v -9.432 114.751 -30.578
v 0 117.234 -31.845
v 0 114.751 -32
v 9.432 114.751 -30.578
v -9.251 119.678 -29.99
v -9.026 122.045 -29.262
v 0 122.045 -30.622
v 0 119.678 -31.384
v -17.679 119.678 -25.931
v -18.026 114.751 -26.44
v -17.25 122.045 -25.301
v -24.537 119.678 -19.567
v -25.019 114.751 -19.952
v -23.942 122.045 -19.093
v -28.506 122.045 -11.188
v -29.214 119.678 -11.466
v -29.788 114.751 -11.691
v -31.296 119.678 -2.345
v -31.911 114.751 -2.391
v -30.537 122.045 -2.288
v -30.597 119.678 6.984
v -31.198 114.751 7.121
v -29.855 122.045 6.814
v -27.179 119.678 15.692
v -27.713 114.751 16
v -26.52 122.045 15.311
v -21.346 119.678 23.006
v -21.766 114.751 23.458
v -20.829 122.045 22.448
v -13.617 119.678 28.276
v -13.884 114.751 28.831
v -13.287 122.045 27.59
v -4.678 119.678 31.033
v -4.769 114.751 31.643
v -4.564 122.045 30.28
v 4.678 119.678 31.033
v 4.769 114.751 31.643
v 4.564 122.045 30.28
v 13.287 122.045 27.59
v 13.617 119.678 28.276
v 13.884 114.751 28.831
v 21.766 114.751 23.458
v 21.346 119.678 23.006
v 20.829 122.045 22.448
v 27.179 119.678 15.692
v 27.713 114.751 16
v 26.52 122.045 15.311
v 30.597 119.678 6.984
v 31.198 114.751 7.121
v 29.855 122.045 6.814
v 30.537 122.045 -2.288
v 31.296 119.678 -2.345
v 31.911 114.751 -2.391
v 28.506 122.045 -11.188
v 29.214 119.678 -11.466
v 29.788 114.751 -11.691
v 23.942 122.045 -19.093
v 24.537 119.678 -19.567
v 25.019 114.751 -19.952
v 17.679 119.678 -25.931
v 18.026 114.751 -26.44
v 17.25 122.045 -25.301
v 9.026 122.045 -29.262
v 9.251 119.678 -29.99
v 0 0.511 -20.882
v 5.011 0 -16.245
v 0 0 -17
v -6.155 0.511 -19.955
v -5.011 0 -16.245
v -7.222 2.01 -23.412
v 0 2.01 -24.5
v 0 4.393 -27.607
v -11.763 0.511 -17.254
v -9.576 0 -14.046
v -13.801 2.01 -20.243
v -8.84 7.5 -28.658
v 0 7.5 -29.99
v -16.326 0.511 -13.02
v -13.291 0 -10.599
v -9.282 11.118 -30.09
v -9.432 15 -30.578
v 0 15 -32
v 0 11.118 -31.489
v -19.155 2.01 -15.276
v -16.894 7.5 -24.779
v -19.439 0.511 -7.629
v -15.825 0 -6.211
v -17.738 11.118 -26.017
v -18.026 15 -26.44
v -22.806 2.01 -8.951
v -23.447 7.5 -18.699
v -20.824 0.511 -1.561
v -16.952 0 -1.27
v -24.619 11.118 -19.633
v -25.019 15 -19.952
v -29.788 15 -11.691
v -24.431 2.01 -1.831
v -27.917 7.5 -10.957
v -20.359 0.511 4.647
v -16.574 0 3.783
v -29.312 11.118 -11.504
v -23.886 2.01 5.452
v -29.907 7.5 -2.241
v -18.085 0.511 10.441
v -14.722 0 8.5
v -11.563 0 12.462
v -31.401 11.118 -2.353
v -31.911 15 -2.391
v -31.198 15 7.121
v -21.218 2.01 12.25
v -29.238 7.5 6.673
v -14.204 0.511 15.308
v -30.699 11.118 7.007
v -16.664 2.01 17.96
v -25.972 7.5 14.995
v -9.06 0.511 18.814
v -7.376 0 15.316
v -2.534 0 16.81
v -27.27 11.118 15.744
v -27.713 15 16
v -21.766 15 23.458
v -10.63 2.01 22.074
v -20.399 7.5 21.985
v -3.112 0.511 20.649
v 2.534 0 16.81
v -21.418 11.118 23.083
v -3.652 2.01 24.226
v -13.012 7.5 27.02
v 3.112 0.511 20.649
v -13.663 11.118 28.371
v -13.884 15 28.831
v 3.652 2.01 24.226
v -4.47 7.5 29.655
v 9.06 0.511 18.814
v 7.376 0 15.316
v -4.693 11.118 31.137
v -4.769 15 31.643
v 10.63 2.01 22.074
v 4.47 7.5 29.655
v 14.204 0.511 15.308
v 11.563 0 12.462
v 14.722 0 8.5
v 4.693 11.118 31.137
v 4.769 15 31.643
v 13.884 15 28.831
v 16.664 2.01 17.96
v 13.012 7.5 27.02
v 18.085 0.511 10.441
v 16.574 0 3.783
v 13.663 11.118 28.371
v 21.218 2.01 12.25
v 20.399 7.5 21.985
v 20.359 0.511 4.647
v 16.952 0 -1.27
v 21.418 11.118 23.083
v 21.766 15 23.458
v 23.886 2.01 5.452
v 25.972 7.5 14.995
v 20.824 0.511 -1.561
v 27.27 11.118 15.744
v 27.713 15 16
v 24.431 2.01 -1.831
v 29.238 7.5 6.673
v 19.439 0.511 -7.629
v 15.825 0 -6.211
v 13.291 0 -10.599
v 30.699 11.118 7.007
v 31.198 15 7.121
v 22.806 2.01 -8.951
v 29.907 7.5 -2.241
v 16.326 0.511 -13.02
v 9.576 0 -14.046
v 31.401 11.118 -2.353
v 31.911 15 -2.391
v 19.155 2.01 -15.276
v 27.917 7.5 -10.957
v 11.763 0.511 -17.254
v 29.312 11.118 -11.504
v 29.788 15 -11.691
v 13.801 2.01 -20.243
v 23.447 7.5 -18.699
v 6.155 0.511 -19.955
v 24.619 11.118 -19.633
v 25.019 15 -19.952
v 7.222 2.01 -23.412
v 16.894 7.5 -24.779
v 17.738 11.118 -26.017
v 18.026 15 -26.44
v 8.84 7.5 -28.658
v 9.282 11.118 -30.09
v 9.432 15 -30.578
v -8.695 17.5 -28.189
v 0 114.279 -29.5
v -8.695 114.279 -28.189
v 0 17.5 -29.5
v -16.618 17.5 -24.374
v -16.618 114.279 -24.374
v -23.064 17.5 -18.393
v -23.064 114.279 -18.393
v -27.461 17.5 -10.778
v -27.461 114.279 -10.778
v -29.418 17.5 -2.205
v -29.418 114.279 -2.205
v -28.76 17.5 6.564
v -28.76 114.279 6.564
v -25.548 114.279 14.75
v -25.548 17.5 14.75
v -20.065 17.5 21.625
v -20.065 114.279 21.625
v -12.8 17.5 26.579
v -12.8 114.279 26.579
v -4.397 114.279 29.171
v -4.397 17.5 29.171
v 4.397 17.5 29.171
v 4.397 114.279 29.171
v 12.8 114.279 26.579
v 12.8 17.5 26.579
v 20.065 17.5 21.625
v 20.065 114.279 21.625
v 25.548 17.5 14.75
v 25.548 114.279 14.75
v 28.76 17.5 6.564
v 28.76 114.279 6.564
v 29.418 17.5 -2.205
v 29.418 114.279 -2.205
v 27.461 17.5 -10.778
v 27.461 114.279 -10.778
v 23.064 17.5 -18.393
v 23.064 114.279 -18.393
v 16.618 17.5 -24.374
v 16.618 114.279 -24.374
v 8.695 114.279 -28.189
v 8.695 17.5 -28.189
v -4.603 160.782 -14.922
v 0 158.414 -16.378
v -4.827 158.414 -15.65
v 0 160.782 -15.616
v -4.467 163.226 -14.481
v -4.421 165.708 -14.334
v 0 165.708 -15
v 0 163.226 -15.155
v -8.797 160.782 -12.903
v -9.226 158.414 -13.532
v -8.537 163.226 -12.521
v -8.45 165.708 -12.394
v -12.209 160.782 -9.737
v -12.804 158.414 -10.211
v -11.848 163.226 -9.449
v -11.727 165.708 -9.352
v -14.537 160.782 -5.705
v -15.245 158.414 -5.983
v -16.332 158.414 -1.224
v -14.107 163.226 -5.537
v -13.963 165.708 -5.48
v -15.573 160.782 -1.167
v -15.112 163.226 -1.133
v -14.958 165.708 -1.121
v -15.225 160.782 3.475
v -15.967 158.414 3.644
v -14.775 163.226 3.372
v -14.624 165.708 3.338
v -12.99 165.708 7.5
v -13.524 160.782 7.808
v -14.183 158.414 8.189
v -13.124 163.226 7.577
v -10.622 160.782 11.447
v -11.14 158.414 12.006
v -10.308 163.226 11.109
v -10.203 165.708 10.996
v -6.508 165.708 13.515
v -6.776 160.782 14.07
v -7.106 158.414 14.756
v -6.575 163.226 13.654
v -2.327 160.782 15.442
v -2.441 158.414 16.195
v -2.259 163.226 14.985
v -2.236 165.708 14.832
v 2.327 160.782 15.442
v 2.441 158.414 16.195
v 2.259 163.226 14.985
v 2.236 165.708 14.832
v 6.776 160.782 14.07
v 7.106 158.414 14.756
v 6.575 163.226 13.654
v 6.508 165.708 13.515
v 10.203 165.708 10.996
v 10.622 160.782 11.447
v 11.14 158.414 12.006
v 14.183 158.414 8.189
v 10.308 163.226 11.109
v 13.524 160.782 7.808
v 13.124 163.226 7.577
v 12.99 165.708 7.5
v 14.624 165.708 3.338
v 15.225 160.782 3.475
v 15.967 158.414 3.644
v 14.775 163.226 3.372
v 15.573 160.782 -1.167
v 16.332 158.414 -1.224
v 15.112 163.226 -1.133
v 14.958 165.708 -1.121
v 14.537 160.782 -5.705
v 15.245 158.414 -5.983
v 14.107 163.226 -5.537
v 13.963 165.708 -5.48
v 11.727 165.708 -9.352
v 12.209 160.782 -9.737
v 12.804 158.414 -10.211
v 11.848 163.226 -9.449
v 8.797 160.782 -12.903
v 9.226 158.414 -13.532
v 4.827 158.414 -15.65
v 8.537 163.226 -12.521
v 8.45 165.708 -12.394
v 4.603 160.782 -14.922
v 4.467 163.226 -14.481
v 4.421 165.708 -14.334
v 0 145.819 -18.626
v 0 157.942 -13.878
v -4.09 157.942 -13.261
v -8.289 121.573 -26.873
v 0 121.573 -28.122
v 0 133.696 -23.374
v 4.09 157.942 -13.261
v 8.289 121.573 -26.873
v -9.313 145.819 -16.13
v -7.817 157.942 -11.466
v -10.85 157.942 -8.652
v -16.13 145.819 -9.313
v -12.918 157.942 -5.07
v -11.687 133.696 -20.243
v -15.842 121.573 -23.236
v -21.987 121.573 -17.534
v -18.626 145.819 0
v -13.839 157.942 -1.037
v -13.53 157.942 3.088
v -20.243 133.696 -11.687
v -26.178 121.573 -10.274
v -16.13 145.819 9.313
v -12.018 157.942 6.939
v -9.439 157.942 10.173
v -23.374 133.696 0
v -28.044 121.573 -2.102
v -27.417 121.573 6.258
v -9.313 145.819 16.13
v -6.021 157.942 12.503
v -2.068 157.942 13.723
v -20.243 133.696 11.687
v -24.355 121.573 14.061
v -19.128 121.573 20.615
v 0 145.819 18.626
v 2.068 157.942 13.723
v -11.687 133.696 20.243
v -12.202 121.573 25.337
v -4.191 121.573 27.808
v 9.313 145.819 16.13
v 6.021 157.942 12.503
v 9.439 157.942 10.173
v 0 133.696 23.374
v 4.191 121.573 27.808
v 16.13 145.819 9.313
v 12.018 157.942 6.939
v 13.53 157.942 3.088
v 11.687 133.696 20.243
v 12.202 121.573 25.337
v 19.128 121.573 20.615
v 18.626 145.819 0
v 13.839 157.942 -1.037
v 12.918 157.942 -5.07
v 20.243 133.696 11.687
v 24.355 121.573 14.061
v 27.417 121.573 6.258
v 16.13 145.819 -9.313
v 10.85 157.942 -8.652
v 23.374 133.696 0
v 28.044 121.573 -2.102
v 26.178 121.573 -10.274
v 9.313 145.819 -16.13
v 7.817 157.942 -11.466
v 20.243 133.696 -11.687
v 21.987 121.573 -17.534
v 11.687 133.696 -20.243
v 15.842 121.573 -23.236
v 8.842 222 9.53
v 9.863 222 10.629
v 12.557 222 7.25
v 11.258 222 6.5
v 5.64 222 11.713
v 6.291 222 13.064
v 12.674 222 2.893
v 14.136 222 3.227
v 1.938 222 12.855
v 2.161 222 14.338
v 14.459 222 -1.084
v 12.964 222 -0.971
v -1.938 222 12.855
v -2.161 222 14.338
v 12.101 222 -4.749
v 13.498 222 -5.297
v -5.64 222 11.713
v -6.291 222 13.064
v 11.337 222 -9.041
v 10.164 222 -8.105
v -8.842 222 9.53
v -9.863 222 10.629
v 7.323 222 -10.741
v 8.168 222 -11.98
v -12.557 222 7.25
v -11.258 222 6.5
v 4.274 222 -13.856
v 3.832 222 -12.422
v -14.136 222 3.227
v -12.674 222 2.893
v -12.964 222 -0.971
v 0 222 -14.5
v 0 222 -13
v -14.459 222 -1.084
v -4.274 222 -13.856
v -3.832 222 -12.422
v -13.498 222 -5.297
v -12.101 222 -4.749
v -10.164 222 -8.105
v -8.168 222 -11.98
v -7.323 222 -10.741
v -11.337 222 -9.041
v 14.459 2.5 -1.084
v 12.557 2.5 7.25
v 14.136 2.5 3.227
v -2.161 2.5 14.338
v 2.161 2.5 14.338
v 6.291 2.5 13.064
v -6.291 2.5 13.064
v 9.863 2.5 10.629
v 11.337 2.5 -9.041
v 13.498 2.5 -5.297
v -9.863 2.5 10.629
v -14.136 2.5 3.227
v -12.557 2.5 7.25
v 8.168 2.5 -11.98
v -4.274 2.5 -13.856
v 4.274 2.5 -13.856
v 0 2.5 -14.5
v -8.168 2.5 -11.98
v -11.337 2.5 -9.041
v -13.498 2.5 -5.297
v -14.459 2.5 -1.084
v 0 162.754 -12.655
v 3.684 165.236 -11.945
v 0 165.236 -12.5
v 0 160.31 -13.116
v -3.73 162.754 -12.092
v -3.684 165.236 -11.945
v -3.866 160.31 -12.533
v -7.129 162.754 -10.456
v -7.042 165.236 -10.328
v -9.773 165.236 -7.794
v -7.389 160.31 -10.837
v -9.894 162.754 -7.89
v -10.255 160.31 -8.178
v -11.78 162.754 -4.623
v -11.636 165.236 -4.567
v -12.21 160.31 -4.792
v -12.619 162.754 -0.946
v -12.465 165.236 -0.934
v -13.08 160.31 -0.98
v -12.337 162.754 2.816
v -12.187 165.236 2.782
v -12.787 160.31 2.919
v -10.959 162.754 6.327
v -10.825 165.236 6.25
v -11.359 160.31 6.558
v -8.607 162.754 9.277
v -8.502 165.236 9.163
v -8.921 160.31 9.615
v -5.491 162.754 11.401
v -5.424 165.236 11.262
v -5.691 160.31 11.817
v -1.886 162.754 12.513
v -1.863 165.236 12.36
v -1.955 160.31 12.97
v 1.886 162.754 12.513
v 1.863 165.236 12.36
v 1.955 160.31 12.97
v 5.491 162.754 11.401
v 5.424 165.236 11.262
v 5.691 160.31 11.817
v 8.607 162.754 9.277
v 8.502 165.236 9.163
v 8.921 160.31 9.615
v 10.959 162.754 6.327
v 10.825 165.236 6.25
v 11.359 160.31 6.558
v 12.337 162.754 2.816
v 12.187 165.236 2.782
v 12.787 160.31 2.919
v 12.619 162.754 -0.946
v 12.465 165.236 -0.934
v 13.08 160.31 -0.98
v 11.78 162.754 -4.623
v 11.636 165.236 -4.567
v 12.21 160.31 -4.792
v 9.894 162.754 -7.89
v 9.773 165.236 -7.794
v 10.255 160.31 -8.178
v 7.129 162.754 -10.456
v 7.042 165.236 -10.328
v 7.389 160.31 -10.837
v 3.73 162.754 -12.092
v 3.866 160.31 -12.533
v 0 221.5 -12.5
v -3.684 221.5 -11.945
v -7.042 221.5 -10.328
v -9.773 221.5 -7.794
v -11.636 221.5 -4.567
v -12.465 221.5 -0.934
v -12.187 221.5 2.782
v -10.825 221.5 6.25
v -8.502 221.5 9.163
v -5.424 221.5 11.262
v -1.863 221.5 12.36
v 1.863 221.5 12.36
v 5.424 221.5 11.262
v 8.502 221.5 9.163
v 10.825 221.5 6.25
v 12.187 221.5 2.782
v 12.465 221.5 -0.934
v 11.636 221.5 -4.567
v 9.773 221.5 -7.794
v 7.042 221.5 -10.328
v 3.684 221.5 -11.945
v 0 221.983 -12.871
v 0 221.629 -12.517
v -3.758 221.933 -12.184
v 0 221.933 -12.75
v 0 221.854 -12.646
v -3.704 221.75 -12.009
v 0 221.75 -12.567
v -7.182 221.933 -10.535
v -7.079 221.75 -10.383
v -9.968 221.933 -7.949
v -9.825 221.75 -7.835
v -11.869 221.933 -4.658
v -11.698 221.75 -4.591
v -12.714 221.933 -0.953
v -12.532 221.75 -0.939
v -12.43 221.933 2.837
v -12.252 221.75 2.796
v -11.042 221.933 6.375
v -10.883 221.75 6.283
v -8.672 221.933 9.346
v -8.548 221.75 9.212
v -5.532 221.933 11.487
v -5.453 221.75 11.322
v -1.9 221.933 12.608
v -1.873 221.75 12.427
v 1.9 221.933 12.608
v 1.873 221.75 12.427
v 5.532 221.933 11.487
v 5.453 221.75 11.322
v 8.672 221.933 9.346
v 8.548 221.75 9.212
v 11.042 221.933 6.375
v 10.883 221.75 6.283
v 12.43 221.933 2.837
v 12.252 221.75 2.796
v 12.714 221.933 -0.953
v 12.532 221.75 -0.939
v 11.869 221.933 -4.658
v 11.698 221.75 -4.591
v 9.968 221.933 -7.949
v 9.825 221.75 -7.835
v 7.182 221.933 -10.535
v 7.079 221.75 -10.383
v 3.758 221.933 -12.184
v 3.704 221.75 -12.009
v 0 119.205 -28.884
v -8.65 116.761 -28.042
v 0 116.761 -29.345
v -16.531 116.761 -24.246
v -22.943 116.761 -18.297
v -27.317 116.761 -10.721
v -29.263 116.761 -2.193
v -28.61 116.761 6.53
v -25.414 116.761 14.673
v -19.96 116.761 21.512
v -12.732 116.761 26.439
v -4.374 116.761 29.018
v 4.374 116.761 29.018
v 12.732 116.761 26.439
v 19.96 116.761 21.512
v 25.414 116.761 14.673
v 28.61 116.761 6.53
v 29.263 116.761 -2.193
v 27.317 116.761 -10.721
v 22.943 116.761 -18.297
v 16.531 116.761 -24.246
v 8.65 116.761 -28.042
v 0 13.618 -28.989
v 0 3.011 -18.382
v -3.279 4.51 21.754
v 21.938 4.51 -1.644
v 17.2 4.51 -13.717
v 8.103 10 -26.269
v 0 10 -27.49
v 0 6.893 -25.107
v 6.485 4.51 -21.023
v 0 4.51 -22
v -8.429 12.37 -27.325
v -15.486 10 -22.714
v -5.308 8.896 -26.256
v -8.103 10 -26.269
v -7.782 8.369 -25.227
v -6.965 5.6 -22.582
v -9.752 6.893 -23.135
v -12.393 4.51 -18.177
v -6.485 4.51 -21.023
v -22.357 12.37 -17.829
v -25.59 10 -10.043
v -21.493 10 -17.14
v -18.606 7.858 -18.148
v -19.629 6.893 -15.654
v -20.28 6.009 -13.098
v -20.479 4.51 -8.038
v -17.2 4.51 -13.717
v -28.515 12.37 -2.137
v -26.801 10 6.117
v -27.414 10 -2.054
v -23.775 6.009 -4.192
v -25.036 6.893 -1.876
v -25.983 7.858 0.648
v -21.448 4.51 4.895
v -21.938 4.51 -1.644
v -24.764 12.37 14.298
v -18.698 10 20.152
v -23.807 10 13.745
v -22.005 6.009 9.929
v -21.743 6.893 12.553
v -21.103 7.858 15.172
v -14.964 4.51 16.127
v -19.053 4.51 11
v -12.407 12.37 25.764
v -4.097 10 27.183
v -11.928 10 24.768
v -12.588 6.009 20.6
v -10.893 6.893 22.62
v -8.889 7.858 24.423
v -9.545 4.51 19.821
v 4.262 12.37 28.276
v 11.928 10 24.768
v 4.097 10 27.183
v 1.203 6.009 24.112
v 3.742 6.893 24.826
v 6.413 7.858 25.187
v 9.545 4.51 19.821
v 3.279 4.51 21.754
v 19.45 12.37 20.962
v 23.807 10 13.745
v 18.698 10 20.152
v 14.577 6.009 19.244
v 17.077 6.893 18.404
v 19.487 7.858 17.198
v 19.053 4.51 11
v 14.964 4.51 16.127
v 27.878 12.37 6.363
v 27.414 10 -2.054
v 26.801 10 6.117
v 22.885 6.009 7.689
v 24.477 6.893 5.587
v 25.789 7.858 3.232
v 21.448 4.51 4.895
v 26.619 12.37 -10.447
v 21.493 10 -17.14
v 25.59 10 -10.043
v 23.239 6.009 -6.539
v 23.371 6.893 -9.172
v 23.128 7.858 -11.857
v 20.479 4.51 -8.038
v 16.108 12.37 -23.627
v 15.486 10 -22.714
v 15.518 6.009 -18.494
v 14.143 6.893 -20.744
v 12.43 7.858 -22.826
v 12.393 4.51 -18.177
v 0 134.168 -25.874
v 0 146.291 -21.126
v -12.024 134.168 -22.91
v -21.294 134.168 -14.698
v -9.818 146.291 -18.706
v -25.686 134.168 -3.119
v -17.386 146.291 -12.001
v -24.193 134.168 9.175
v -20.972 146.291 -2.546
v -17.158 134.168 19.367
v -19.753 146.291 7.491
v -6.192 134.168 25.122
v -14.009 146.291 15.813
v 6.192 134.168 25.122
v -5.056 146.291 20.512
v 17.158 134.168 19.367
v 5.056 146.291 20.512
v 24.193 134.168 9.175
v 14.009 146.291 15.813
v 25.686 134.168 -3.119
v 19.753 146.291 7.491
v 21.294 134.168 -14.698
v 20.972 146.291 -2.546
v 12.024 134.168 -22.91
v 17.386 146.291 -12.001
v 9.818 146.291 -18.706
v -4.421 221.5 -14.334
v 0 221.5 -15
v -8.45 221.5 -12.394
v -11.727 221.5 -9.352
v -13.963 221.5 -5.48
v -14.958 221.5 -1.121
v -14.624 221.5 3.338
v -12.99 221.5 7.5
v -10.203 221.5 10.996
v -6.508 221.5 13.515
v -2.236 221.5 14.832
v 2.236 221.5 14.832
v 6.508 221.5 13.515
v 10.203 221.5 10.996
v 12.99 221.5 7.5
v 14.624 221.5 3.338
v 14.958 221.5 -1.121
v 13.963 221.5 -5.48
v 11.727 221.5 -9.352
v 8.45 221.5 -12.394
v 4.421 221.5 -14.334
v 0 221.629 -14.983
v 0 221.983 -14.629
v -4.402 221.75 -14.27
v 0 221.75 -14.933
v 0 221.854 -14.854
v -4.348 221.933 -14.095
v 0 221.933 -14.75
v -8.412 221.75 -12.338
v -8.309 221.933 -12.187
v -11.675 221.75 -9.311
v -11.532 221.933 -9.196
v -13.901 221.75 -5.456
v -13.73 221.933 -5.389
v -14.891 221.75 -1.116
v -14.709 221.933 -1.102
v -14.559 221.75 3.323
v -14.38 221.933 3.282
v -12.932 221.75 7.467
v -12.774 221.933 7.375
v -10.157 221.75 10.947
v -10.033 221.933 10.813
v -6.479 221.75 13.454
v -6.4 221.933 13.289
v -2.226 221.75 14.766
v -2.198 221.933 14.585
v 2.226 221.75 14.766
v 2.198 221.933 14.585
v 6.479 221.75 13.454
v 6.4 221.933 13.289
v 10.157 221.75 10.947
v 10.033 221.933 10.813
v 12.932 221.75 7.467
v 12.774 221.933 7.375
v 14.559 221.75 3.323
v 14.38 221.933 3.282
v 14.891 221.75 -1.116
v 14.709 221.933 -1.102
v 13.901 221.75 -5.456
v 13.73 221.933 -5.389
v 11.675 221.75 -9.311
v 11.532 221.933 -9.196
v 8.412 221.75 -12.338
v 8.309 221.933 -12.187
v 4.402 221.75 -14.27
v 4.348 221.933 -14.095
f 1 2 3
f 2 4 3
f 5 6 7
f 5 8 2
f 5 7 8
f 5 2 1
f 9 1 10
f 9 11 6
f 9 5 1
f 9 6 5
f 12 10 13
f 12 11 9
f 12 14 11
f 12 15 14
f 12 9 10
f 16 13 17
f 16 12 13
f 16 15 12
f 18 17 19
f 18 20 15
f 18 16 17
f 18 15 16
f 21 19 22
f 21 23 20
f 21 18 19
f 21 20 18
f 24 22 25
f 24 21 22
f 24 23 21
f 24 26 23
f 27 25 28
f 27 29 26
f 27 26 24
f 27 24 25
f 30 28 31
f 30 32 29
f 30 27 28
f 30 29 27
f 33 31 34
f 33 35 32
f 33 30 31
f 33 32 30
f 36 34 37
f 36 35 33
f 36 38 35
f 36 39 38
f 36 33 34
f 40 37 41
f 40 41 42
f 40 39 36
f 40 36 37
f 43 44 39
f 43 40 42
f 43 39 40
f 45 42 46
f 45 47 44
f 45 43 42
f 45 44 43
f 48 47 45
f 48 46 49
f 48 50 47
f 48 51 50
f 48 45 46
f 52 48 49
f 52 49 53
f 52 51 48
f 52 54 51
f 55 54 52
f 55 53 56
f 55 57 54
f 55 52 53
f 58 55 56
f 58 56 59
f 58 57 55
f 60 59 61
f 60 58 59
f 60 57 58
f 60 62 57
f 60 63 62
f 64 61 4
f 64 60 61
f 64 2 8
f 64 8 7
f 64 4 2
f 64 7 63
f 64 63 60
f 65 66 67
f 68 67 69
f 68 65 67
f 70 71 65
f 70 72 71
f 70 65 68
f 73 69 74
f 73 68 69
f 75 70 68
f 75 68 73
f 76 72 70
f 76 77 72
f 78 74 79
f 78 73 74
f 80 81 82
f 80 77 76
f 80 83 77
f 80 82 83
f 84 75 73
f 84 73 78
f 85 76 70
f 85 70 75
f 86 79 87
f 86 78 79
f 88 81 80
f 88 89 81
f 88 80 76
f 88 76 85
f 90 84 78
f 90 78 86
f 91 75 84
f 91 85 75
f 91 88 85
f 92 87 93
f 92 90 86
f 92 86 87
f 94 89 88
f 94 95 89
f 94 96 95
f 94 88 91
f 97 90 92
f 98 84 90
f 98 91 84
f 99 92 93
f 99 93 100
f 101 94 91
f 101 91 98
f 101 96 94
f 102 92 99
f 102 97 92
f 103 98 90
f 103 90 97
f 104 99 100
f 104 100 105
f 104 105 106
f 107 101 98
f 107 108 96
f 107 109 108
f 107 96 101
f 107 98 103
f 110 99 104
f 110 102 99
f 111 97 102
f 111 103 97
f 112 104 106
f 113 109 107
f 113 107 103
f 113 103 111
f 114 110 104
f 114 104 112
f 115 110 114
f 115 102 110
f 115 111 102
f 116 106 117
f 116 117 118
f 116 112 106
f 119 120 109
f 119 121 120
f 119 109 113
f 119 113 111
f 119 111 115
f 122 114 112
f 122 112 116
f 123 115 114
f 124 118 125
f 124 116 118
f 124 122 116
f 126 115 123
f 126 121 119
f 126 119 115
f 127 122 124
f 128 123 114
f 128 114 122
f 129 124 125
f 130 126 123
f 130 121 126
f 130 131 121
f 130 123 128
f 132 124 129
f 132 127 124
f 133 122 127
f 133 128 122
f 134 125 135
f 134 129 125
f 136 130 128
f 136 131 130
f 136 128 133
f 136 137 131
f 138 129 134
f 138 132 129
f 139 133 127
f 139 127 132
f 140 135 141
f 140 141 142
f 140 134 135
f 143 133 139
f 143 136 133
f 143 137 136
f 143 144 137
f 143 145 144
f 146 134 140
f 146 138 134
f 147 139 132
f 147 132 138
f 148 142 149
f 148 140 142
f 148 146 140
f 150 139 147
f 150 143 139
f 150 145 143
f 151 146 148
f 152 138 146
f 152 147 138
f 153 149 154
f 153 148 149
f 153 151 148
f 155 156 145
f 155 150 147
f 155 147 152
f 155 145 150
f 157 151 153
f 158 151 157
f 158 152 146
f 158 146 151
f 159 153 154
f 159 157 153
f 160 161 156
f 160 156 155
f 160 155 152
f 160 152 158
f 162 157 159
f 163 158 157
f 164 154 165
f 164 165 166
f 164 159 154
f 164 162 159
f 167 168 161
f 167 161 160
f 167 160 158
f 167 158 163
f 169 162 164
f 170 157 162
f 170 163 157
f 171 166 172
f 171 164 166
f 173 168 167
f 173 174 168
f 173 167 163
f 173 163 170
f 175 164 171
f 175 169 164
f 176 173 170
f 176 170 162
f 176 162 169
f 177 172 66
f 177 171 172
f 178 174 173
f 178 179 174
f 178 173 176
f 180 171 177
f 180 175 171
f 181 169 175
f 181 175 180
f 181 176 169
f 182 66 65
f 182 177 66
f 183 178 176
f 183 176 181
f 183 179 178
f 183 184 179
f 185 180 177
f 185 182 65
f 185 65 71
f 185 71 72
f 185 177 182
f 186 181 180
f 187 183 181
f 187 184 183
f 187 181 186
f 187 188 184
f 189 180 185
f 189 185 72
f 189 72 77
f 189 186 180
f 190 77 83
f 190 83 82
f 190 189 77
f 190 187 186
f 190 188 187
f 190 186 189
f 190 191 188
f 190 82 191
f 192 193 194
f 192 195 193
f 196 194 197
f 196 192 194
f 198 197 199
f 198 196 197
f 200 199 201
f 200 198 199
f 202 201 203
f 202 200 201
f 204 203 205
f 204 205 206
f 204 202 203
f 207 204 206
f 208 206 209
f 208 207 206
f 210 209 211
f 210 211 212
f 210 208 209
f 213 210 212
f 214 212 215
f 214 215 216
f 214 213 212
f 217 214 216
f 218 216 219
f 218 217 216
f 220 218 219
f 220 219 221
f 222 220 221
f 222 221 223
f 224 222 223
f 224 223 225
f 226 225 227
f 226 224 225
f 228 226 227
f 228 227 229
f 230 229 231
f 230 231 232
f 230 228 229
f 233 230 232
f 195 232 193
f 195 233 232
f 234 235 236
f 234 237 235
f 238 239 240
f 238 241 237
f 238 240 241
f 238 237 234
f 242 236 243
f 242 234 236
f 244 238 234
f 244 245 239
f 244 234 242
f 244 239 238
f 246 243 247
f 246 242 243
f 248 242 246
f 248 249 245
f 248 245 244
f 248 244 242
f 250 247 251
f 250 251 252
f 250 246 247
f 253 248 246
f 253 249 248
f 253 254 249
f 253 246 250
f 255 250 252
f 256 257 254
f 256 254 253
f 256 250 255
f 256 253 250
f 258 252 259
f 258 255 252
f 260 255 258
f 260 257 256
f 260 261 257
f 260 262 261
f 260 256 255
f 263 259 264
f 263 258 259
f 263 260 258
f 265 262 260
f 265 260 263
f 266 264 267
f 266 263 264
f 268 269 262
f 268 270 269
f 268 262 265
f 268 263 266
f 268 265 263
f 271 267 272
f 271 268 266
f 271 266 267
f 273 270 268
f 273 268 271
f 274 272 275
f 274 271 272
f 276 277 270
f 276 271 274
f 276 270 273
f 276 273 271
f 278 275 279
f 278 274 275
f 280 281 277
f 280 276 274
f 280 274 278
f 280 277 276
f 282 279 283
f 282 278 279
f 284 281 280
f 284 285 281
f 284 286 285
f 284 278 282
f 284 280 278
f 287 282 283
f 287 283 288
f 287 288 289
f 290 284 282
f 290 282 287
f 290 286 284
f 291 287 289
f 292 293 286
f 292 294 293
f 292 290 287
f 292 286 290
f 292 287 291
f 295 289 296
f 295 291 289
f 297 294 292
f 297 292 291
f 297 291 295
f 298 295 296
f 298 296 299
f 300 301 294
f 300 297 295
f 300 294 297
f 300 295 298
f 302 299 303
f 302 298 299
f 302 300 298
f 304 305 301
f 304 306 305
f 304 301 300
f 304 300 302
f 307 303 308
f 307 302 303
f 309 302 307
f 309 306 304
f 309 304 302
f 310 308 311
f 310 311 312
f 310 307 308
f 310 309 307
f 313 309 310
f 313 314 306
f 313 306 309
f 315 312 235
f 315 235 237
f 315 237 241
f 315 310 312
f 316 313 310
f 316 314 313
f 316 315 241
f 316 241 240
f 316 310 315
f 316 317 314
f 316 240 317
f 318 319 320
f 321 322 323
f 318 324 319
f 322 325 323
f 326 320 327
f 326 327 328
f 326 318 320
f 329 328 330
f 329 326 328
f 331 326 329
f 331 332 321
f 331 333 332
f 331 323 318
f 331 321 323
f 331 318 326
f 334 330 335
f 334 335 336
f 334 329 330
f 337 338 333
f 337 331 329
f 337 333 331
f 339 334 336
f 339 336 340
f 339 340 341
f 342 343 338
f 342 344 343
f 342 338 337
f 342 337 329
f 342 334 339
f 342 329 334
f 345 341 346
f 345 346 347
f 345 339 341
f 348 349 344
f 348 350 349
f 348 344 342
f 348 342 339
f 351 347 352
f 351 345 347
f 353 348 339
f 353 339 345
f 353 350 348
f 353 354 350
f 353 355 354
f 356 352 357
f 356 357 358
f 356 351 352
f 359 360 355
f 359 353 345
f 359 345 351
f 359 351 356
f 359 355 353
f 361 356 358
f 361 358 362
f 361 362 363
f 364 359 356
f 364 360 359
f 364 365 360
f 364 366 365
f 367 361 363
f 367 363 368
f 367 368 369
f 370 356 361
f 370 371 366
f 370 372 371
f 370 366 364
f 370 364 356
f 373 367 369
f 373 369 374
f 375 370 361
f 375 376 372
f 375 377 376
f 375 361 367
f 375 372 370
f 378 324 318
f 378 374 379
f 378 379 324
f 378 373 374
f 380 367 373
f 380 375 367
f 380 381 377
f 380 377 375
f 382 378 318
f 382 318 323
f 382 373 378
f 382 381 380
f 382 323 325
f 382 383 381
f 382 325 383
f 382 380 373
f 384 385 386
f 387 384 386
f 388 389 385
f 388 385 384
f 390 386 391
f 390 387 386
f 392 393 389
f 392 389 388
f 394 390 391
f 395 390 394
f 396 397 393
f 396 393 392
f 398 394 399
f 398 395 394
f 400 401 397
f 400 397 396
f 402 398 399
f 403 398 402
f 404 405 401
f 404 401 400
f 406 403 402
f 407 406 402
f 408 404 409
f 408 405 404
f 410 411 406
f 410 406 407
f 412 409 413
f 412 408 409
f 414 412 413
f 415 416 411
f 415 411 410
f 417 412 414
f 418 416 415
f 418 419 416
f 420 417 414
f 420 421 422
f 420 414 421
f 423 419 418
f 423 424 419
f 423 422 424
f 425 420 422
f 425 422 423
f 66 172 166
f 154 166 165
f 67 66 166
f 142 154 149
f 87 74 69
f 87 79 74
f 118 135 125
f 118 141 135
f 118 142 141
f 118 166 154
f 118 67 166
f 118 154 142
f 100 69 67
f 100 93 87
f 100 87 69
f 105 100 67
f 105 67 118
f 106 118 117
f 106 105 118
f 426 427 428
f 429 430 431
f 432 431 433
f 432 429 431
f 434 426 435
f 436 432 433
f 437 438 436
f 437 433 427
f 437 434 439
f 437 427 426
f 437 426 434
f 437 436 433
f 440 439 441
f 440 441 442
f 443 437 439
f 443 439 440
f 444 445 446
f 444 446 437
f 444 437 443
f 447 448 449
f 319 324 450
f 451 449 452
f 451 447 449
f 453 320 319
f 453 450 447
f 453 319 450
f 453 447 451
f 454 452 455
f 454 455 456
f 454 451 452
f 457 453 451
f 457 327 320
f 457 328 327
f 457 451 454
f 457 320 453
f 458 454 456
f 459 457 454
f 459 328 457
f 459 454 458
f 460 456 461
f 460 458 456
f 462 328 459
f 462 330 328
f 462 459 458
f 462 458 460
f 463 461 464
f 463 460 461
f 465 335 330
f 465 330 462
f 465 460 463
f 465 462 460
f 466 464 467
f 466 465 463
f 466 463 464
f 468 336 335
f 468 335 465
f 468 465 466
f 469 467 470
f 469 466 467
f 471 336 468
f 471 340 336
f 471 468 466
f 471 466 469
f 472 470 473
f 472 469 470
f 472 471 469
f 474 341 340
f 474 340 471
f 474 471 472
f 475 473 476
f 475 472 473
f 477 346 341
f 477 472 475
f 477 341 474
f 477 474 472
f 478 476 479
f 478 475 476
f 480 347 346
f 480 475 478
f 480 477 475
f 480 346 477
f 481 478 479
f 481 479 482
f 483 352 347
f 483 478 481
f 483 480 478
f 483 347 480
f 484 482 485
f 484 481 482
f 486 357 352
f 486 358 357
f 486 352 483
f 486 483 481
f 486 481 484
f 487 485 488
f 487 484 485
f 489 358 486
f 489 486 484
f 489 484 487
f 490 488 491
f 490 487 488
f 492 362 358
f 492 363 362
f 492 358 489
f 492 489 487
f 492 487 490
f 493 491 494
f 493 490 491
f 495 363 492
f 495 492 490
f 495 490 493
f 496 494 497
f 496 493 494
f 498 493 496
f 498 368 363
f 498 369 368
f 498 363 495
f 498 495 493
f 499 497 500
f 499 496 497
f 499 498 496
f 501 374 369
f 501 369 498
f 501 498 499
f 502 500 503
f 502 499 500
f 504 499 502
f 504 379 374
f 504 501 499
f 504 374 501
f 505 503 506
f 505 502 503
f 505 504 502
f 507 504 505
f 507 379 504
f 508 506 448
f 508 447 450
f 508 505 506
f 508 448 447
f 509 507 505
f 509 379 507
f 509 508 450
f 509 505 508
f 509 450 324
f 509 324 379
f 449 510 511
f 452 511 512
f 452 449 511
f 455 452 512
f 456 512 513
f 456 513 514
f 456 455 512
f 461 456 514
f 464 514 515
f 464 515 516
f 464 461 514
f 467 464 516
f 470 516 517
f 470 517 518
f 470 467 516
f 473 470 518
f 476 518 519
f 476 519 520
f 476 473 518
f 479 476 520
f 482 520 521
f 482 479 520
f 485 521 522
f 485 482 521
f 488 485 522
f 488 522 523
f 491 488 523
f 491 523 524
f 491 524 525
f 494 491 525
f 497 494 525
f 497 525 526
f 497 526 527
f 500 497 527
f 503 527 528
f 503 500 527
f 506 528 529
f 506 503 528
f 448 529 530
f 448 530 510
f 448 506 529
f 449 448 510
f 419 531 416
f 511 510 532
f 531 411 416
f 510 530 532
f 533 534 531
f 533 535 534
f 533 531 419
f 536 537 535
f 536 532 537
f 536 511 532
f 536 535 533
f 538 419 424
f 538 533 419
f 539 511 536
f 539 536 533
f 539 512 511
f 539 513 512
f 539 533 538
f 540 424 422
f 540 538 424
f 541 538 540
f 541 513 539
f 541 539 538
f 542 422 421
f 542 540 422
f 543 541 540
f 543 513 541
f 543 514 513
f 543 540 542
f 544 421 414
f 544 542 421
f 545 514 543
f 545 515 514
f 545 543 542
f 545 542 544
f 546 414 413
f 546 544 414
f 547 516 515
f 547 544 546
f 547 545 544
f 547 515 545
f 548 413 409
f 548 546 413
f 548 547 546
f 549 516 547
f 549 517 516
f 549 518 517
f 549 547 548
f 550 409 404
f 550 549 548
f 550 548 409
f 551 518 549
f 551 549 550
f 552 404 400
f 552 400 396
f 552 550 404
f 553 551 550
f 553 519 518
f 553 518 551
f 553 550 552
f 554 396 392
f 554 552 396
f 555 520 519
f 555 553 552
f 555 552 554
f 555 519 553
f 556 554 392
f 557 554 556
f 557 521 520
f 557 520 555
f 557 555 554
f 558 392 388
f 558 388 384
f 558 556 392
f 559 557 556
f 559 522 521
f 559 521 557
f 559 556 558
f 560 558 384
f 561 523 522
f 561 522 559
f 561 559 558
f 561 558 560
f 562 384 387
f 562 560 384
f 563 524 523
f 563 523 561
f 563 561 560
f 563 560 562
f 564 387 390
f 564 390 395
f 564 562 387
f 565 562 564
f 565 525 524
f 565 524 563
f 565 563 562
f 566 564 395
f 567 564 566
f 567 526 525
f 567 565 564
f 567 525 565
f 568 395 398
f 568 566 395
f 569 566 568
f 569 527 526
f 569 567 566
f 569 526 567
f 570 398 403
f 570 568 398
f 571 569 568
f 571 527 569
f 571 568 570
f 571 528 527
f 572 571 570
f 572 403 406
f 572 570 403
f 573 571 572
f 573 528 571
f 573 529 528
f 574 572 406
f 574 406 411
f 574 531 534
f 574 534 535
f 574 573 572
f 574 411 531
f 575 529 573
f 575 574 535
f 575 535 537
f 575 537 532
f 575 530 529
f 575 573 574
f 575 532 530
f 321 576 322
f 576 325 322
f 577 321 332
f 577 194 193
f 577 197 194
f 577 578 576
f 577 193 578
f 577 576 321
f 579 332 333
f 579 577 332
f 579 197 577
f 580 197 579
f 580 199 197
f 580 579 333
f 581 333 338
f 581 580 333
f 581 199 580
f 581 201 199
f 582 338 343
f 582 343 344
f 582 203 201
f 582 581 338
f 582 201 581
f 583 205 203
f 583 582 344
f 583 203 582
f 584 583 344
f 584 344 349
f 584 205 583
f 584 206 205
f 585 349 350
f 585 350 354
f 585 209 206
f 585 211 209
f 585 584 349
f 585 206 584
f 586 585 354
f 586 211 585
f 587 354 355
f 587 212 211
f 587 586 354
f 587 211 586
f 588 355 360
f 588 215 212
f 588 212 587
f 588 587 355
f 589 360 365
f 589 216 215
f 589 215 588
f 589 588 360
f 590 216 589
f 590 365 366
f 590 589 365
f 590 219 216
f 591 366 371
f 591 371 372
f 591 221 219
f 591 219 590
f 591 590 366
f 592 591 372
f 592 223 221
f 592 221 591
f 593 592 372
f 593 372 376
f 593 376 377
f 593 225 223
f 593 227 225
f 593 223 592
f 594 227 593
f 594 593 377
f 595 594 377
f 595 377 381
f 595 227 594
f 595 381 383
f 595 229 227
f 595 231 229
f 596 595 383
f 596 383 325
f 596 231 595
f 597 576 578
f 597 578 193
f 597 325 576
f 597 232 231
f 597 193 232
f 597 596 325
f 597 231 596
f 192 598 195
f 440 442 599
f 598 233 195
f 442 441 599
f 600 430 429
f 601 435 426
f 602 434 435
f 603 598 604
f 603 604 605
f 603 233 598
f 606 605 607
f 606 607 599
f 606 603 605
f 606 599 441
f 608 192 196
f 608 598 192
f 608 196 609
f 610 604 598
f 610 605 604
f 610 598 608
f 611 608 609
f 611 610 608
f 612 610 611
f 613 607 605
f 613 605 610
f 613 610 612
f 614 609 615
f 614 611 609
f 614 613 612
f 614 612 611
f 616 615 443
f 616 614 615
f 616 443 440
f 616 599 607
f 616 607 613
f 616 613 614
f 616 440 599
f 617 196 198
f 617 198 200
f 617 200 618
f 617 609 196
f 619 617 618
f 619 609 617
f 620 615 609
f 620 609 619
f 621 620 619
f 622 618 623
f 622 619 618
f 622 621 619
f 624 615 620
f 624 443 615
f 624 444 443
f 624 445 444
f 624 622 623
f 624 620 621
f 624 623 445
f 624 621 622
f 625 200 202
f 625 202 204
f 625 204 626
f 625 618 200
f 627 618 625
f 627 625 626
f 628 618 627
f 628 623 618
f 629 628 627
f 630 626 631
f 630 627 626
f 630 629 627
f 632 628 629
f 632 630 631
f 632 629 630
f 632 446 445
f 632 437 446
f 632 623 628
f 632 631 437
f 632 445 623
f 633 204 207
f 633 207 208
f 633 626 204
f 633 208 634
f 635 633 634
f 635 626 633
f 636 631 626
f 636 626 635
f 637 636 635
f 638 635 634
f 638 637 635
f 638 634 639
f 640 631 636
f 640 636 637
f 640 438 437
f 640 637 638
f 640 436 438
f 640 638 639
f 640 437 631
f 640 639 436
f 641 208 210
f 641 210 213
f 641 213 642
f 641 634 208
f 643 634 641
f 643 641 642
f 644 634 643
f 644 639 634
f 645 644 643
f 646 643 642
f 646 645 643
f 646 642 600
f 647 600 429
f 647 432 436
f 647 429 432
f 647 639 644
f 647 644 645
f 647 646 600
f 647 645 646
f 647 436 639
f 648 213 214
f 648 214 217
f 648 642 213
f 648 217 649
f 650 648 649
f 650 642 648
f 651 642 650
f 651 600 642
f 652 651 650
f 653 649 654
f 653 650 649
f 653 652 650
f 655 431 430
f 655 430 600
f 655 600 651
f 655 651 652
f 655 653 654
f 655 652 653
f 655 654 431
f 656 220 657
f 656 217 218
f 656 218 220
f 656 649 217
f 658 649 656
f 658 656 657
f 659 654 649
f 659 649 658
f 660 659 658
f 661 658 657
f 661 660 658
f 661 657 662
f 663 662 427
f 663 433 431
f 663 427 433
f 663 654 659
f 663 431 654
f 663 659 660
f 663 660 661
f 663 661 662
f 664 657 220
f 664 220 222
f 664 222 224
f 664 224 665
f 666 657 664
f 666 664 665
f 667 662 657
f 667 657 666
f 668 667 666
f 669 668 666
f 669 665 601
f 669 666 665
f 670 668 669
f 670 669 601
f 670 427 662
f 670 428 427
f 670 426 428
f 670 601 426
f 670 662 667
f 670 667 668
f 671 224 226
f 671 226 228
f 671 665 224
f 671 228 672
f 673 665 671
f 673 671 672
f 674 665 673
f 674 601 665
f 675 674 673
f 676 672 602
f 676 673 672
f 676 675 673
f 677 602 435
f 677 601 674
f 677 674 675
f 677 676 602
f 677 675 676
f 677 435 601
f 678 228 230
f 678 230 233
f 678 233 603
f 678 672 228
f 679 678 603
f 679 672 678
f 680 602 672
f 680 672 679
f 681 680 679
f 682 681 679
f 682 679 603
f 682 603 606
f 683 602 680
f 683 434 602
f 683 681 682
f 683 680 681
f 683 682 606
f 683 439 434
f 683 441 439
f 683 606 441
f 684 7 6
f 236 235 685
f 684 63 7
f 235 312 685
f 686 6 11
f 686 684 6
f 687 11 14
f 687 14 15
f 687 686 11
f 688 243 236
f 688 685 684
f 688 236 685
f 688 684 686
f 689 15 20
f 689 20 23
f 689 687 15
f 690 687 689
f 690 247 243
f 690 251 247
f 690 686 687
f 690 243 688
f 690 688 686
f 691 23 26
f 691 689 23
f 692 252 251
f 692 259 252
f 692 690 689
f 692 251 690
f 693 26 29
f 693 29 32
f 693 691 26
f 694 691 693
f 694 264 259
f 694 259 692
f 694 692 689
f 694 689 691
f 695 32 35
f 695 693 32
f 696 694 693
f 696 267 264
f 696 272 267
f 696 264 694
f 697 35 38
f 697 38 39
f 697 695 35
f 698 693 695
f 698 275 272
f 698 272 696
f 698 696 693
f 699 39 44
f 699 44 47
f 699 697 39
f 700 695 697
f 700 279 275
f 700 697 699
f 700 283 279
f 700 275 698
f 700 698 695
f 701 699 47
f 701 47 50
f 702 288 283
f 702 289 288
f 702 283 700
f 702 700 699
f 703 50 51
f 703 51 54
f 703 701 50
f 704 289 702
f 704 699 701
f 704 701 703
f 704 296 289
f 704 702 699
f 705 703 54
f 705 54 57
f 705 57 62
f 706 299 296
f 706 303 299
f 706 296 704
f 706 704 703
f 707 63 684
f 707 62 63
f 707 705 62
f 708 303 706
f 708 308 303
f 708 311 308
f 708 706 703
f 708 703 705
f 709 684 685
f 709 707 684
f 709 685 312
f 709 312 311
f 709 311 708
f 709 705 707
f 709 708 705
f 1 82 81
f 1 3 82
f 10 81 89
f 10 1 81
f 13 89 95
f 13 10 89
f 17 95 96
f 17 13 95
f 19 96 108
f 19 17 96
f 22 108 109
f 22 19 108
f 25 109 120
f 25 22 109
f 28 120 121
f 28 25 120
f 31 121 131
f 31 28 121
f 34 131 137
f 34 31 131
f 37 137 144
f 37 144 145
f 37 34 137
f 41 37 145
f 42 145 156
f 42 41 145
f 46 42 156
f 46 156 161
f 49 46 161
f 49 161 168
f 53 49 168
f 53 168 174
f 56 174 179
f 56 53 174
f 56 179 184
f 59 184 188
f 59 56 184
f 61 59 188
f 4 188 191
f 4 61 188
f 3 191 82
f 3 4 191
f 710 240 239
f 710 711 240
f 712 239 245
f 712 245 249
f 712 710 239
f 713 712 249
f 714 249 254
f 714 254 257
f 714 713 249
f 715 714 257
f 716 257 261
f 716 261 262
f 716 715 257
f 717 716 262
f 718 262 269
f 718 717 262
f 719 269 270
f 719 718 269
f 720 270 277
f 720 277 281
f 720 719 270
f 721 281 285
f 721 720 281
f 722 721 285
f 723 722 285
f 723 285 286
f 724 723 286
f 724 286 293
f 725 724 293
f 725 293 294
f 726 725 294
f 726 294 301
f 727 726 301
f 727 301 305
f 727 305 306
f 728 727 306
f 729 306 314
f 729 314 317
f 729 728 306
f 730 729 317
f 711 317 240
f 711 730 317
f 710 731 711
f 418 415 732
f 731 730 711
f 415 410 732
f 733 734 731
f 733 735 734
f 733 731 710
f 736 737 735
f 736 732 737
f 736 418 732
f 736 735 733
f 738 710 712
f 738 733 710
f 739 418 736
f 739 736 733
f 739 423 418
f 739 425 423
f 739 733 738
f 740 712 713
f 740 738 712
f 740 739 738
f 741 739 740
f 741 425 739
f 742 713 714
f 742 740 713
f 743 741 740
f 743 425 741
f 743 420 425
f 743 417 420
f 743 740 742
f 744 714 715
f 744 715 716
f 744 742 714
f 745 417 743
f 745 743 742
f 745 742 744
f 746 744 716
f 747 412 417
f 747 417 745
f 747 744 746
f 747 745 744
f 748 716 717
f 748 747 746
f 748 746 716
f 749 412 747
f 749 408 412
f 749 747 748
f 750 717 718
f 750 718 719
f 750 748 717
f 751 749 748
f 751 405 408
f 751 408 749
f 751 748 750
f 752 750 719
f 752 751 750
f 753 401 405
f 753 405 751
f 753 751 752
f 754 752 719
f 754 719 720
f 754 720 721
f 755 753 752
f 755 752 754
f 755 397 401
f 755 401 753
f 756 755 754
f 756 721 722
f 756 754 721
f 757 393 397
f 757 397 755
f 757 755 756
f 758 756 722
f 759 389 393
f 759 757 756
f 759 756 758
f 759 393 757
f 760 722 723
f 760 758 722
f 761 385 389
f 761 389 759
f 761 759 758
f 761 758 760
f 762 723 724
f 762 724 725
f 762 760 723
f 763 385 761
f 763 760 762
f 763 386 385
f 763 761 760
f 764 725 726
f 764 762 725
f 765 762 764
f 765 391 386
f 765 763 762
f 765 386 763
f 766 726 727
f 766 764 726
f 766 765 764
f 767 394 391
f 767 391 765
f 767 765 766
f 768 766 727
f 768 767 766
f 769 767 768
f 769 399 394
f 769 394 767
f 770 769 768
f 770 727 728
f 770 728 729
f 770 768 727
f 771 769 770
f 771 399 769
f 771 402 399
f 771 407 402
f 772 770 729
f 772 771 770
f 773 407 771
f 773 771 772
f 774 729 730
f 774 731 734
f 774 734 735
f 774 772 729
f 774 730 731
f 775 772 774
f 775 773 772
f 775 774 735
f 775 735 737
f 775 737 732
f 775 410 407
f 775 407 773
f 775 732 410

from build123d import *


with BuildPart() as part:
    # Sketch1 → Revolve1 (revolve)
    with BuildSketch(Plane(origin=(0, 0, 0), x_dir=(0, 0, -1), z_dir=(1, 0, 0))):
        with BuildLine():
            Line((0, 0), (17, 0))
            ThreePointArc((17, 0), (27.606601718, 4.393398282), (32, 15))
            Line((32, 15), (32, 114.751276219))
            ThreePointArc((32, 114.751276219), (31.652603278, 118.46276977), (30.622481562, 122.045327253))
            Line((30.622481562, 122.045327253), (16.377518438, 158.414220463))
            ThreePointArc((16.377518438, 158.414220463), (15.347396722, 161.996777946), (15, 165.708271497))
            Line((15, 165.708271497), (15, 221.5))
            ThreePointArc((15, 221.5), (14.853553391, 221.853553391), (14.5, 222))
            Line((14.5, 222), (13, 222))
            ThreePointArc((13, 222), (12.646446609, 221.853553391), (12.5, 221.5))
            Line((12.5, 221.5), (12.5, 211.633388036))
            Line((12.5, 211.633388036), (12.5, 165.23613385))
            ThreePointArc((12.5, 165.23613385), (12.847396722, 161.524640298), (13.877518438, 157.942082816))
            Line((13.877518438, 157.942082816), (28.122481562, 121.573189605))
            ThreePointArc((28.122481562, 121.573189605), (29.152603278, 117.990632123), (29.5, 114.279138571))
            Line((29.5, 114.279138571), (29.5, 17.5))
            ThreePointArc((29.5, 17.5), (25.106601718, 6.893398282), (14.5, 2.5))
            Line((14.5, 2.5), (0, 2.5))
            Line((0, 2.5), (0, 0))
        make_face()
    revolve(axis=Axis((0, 0, 0), (0, 1, 0)))


solid = part.part
